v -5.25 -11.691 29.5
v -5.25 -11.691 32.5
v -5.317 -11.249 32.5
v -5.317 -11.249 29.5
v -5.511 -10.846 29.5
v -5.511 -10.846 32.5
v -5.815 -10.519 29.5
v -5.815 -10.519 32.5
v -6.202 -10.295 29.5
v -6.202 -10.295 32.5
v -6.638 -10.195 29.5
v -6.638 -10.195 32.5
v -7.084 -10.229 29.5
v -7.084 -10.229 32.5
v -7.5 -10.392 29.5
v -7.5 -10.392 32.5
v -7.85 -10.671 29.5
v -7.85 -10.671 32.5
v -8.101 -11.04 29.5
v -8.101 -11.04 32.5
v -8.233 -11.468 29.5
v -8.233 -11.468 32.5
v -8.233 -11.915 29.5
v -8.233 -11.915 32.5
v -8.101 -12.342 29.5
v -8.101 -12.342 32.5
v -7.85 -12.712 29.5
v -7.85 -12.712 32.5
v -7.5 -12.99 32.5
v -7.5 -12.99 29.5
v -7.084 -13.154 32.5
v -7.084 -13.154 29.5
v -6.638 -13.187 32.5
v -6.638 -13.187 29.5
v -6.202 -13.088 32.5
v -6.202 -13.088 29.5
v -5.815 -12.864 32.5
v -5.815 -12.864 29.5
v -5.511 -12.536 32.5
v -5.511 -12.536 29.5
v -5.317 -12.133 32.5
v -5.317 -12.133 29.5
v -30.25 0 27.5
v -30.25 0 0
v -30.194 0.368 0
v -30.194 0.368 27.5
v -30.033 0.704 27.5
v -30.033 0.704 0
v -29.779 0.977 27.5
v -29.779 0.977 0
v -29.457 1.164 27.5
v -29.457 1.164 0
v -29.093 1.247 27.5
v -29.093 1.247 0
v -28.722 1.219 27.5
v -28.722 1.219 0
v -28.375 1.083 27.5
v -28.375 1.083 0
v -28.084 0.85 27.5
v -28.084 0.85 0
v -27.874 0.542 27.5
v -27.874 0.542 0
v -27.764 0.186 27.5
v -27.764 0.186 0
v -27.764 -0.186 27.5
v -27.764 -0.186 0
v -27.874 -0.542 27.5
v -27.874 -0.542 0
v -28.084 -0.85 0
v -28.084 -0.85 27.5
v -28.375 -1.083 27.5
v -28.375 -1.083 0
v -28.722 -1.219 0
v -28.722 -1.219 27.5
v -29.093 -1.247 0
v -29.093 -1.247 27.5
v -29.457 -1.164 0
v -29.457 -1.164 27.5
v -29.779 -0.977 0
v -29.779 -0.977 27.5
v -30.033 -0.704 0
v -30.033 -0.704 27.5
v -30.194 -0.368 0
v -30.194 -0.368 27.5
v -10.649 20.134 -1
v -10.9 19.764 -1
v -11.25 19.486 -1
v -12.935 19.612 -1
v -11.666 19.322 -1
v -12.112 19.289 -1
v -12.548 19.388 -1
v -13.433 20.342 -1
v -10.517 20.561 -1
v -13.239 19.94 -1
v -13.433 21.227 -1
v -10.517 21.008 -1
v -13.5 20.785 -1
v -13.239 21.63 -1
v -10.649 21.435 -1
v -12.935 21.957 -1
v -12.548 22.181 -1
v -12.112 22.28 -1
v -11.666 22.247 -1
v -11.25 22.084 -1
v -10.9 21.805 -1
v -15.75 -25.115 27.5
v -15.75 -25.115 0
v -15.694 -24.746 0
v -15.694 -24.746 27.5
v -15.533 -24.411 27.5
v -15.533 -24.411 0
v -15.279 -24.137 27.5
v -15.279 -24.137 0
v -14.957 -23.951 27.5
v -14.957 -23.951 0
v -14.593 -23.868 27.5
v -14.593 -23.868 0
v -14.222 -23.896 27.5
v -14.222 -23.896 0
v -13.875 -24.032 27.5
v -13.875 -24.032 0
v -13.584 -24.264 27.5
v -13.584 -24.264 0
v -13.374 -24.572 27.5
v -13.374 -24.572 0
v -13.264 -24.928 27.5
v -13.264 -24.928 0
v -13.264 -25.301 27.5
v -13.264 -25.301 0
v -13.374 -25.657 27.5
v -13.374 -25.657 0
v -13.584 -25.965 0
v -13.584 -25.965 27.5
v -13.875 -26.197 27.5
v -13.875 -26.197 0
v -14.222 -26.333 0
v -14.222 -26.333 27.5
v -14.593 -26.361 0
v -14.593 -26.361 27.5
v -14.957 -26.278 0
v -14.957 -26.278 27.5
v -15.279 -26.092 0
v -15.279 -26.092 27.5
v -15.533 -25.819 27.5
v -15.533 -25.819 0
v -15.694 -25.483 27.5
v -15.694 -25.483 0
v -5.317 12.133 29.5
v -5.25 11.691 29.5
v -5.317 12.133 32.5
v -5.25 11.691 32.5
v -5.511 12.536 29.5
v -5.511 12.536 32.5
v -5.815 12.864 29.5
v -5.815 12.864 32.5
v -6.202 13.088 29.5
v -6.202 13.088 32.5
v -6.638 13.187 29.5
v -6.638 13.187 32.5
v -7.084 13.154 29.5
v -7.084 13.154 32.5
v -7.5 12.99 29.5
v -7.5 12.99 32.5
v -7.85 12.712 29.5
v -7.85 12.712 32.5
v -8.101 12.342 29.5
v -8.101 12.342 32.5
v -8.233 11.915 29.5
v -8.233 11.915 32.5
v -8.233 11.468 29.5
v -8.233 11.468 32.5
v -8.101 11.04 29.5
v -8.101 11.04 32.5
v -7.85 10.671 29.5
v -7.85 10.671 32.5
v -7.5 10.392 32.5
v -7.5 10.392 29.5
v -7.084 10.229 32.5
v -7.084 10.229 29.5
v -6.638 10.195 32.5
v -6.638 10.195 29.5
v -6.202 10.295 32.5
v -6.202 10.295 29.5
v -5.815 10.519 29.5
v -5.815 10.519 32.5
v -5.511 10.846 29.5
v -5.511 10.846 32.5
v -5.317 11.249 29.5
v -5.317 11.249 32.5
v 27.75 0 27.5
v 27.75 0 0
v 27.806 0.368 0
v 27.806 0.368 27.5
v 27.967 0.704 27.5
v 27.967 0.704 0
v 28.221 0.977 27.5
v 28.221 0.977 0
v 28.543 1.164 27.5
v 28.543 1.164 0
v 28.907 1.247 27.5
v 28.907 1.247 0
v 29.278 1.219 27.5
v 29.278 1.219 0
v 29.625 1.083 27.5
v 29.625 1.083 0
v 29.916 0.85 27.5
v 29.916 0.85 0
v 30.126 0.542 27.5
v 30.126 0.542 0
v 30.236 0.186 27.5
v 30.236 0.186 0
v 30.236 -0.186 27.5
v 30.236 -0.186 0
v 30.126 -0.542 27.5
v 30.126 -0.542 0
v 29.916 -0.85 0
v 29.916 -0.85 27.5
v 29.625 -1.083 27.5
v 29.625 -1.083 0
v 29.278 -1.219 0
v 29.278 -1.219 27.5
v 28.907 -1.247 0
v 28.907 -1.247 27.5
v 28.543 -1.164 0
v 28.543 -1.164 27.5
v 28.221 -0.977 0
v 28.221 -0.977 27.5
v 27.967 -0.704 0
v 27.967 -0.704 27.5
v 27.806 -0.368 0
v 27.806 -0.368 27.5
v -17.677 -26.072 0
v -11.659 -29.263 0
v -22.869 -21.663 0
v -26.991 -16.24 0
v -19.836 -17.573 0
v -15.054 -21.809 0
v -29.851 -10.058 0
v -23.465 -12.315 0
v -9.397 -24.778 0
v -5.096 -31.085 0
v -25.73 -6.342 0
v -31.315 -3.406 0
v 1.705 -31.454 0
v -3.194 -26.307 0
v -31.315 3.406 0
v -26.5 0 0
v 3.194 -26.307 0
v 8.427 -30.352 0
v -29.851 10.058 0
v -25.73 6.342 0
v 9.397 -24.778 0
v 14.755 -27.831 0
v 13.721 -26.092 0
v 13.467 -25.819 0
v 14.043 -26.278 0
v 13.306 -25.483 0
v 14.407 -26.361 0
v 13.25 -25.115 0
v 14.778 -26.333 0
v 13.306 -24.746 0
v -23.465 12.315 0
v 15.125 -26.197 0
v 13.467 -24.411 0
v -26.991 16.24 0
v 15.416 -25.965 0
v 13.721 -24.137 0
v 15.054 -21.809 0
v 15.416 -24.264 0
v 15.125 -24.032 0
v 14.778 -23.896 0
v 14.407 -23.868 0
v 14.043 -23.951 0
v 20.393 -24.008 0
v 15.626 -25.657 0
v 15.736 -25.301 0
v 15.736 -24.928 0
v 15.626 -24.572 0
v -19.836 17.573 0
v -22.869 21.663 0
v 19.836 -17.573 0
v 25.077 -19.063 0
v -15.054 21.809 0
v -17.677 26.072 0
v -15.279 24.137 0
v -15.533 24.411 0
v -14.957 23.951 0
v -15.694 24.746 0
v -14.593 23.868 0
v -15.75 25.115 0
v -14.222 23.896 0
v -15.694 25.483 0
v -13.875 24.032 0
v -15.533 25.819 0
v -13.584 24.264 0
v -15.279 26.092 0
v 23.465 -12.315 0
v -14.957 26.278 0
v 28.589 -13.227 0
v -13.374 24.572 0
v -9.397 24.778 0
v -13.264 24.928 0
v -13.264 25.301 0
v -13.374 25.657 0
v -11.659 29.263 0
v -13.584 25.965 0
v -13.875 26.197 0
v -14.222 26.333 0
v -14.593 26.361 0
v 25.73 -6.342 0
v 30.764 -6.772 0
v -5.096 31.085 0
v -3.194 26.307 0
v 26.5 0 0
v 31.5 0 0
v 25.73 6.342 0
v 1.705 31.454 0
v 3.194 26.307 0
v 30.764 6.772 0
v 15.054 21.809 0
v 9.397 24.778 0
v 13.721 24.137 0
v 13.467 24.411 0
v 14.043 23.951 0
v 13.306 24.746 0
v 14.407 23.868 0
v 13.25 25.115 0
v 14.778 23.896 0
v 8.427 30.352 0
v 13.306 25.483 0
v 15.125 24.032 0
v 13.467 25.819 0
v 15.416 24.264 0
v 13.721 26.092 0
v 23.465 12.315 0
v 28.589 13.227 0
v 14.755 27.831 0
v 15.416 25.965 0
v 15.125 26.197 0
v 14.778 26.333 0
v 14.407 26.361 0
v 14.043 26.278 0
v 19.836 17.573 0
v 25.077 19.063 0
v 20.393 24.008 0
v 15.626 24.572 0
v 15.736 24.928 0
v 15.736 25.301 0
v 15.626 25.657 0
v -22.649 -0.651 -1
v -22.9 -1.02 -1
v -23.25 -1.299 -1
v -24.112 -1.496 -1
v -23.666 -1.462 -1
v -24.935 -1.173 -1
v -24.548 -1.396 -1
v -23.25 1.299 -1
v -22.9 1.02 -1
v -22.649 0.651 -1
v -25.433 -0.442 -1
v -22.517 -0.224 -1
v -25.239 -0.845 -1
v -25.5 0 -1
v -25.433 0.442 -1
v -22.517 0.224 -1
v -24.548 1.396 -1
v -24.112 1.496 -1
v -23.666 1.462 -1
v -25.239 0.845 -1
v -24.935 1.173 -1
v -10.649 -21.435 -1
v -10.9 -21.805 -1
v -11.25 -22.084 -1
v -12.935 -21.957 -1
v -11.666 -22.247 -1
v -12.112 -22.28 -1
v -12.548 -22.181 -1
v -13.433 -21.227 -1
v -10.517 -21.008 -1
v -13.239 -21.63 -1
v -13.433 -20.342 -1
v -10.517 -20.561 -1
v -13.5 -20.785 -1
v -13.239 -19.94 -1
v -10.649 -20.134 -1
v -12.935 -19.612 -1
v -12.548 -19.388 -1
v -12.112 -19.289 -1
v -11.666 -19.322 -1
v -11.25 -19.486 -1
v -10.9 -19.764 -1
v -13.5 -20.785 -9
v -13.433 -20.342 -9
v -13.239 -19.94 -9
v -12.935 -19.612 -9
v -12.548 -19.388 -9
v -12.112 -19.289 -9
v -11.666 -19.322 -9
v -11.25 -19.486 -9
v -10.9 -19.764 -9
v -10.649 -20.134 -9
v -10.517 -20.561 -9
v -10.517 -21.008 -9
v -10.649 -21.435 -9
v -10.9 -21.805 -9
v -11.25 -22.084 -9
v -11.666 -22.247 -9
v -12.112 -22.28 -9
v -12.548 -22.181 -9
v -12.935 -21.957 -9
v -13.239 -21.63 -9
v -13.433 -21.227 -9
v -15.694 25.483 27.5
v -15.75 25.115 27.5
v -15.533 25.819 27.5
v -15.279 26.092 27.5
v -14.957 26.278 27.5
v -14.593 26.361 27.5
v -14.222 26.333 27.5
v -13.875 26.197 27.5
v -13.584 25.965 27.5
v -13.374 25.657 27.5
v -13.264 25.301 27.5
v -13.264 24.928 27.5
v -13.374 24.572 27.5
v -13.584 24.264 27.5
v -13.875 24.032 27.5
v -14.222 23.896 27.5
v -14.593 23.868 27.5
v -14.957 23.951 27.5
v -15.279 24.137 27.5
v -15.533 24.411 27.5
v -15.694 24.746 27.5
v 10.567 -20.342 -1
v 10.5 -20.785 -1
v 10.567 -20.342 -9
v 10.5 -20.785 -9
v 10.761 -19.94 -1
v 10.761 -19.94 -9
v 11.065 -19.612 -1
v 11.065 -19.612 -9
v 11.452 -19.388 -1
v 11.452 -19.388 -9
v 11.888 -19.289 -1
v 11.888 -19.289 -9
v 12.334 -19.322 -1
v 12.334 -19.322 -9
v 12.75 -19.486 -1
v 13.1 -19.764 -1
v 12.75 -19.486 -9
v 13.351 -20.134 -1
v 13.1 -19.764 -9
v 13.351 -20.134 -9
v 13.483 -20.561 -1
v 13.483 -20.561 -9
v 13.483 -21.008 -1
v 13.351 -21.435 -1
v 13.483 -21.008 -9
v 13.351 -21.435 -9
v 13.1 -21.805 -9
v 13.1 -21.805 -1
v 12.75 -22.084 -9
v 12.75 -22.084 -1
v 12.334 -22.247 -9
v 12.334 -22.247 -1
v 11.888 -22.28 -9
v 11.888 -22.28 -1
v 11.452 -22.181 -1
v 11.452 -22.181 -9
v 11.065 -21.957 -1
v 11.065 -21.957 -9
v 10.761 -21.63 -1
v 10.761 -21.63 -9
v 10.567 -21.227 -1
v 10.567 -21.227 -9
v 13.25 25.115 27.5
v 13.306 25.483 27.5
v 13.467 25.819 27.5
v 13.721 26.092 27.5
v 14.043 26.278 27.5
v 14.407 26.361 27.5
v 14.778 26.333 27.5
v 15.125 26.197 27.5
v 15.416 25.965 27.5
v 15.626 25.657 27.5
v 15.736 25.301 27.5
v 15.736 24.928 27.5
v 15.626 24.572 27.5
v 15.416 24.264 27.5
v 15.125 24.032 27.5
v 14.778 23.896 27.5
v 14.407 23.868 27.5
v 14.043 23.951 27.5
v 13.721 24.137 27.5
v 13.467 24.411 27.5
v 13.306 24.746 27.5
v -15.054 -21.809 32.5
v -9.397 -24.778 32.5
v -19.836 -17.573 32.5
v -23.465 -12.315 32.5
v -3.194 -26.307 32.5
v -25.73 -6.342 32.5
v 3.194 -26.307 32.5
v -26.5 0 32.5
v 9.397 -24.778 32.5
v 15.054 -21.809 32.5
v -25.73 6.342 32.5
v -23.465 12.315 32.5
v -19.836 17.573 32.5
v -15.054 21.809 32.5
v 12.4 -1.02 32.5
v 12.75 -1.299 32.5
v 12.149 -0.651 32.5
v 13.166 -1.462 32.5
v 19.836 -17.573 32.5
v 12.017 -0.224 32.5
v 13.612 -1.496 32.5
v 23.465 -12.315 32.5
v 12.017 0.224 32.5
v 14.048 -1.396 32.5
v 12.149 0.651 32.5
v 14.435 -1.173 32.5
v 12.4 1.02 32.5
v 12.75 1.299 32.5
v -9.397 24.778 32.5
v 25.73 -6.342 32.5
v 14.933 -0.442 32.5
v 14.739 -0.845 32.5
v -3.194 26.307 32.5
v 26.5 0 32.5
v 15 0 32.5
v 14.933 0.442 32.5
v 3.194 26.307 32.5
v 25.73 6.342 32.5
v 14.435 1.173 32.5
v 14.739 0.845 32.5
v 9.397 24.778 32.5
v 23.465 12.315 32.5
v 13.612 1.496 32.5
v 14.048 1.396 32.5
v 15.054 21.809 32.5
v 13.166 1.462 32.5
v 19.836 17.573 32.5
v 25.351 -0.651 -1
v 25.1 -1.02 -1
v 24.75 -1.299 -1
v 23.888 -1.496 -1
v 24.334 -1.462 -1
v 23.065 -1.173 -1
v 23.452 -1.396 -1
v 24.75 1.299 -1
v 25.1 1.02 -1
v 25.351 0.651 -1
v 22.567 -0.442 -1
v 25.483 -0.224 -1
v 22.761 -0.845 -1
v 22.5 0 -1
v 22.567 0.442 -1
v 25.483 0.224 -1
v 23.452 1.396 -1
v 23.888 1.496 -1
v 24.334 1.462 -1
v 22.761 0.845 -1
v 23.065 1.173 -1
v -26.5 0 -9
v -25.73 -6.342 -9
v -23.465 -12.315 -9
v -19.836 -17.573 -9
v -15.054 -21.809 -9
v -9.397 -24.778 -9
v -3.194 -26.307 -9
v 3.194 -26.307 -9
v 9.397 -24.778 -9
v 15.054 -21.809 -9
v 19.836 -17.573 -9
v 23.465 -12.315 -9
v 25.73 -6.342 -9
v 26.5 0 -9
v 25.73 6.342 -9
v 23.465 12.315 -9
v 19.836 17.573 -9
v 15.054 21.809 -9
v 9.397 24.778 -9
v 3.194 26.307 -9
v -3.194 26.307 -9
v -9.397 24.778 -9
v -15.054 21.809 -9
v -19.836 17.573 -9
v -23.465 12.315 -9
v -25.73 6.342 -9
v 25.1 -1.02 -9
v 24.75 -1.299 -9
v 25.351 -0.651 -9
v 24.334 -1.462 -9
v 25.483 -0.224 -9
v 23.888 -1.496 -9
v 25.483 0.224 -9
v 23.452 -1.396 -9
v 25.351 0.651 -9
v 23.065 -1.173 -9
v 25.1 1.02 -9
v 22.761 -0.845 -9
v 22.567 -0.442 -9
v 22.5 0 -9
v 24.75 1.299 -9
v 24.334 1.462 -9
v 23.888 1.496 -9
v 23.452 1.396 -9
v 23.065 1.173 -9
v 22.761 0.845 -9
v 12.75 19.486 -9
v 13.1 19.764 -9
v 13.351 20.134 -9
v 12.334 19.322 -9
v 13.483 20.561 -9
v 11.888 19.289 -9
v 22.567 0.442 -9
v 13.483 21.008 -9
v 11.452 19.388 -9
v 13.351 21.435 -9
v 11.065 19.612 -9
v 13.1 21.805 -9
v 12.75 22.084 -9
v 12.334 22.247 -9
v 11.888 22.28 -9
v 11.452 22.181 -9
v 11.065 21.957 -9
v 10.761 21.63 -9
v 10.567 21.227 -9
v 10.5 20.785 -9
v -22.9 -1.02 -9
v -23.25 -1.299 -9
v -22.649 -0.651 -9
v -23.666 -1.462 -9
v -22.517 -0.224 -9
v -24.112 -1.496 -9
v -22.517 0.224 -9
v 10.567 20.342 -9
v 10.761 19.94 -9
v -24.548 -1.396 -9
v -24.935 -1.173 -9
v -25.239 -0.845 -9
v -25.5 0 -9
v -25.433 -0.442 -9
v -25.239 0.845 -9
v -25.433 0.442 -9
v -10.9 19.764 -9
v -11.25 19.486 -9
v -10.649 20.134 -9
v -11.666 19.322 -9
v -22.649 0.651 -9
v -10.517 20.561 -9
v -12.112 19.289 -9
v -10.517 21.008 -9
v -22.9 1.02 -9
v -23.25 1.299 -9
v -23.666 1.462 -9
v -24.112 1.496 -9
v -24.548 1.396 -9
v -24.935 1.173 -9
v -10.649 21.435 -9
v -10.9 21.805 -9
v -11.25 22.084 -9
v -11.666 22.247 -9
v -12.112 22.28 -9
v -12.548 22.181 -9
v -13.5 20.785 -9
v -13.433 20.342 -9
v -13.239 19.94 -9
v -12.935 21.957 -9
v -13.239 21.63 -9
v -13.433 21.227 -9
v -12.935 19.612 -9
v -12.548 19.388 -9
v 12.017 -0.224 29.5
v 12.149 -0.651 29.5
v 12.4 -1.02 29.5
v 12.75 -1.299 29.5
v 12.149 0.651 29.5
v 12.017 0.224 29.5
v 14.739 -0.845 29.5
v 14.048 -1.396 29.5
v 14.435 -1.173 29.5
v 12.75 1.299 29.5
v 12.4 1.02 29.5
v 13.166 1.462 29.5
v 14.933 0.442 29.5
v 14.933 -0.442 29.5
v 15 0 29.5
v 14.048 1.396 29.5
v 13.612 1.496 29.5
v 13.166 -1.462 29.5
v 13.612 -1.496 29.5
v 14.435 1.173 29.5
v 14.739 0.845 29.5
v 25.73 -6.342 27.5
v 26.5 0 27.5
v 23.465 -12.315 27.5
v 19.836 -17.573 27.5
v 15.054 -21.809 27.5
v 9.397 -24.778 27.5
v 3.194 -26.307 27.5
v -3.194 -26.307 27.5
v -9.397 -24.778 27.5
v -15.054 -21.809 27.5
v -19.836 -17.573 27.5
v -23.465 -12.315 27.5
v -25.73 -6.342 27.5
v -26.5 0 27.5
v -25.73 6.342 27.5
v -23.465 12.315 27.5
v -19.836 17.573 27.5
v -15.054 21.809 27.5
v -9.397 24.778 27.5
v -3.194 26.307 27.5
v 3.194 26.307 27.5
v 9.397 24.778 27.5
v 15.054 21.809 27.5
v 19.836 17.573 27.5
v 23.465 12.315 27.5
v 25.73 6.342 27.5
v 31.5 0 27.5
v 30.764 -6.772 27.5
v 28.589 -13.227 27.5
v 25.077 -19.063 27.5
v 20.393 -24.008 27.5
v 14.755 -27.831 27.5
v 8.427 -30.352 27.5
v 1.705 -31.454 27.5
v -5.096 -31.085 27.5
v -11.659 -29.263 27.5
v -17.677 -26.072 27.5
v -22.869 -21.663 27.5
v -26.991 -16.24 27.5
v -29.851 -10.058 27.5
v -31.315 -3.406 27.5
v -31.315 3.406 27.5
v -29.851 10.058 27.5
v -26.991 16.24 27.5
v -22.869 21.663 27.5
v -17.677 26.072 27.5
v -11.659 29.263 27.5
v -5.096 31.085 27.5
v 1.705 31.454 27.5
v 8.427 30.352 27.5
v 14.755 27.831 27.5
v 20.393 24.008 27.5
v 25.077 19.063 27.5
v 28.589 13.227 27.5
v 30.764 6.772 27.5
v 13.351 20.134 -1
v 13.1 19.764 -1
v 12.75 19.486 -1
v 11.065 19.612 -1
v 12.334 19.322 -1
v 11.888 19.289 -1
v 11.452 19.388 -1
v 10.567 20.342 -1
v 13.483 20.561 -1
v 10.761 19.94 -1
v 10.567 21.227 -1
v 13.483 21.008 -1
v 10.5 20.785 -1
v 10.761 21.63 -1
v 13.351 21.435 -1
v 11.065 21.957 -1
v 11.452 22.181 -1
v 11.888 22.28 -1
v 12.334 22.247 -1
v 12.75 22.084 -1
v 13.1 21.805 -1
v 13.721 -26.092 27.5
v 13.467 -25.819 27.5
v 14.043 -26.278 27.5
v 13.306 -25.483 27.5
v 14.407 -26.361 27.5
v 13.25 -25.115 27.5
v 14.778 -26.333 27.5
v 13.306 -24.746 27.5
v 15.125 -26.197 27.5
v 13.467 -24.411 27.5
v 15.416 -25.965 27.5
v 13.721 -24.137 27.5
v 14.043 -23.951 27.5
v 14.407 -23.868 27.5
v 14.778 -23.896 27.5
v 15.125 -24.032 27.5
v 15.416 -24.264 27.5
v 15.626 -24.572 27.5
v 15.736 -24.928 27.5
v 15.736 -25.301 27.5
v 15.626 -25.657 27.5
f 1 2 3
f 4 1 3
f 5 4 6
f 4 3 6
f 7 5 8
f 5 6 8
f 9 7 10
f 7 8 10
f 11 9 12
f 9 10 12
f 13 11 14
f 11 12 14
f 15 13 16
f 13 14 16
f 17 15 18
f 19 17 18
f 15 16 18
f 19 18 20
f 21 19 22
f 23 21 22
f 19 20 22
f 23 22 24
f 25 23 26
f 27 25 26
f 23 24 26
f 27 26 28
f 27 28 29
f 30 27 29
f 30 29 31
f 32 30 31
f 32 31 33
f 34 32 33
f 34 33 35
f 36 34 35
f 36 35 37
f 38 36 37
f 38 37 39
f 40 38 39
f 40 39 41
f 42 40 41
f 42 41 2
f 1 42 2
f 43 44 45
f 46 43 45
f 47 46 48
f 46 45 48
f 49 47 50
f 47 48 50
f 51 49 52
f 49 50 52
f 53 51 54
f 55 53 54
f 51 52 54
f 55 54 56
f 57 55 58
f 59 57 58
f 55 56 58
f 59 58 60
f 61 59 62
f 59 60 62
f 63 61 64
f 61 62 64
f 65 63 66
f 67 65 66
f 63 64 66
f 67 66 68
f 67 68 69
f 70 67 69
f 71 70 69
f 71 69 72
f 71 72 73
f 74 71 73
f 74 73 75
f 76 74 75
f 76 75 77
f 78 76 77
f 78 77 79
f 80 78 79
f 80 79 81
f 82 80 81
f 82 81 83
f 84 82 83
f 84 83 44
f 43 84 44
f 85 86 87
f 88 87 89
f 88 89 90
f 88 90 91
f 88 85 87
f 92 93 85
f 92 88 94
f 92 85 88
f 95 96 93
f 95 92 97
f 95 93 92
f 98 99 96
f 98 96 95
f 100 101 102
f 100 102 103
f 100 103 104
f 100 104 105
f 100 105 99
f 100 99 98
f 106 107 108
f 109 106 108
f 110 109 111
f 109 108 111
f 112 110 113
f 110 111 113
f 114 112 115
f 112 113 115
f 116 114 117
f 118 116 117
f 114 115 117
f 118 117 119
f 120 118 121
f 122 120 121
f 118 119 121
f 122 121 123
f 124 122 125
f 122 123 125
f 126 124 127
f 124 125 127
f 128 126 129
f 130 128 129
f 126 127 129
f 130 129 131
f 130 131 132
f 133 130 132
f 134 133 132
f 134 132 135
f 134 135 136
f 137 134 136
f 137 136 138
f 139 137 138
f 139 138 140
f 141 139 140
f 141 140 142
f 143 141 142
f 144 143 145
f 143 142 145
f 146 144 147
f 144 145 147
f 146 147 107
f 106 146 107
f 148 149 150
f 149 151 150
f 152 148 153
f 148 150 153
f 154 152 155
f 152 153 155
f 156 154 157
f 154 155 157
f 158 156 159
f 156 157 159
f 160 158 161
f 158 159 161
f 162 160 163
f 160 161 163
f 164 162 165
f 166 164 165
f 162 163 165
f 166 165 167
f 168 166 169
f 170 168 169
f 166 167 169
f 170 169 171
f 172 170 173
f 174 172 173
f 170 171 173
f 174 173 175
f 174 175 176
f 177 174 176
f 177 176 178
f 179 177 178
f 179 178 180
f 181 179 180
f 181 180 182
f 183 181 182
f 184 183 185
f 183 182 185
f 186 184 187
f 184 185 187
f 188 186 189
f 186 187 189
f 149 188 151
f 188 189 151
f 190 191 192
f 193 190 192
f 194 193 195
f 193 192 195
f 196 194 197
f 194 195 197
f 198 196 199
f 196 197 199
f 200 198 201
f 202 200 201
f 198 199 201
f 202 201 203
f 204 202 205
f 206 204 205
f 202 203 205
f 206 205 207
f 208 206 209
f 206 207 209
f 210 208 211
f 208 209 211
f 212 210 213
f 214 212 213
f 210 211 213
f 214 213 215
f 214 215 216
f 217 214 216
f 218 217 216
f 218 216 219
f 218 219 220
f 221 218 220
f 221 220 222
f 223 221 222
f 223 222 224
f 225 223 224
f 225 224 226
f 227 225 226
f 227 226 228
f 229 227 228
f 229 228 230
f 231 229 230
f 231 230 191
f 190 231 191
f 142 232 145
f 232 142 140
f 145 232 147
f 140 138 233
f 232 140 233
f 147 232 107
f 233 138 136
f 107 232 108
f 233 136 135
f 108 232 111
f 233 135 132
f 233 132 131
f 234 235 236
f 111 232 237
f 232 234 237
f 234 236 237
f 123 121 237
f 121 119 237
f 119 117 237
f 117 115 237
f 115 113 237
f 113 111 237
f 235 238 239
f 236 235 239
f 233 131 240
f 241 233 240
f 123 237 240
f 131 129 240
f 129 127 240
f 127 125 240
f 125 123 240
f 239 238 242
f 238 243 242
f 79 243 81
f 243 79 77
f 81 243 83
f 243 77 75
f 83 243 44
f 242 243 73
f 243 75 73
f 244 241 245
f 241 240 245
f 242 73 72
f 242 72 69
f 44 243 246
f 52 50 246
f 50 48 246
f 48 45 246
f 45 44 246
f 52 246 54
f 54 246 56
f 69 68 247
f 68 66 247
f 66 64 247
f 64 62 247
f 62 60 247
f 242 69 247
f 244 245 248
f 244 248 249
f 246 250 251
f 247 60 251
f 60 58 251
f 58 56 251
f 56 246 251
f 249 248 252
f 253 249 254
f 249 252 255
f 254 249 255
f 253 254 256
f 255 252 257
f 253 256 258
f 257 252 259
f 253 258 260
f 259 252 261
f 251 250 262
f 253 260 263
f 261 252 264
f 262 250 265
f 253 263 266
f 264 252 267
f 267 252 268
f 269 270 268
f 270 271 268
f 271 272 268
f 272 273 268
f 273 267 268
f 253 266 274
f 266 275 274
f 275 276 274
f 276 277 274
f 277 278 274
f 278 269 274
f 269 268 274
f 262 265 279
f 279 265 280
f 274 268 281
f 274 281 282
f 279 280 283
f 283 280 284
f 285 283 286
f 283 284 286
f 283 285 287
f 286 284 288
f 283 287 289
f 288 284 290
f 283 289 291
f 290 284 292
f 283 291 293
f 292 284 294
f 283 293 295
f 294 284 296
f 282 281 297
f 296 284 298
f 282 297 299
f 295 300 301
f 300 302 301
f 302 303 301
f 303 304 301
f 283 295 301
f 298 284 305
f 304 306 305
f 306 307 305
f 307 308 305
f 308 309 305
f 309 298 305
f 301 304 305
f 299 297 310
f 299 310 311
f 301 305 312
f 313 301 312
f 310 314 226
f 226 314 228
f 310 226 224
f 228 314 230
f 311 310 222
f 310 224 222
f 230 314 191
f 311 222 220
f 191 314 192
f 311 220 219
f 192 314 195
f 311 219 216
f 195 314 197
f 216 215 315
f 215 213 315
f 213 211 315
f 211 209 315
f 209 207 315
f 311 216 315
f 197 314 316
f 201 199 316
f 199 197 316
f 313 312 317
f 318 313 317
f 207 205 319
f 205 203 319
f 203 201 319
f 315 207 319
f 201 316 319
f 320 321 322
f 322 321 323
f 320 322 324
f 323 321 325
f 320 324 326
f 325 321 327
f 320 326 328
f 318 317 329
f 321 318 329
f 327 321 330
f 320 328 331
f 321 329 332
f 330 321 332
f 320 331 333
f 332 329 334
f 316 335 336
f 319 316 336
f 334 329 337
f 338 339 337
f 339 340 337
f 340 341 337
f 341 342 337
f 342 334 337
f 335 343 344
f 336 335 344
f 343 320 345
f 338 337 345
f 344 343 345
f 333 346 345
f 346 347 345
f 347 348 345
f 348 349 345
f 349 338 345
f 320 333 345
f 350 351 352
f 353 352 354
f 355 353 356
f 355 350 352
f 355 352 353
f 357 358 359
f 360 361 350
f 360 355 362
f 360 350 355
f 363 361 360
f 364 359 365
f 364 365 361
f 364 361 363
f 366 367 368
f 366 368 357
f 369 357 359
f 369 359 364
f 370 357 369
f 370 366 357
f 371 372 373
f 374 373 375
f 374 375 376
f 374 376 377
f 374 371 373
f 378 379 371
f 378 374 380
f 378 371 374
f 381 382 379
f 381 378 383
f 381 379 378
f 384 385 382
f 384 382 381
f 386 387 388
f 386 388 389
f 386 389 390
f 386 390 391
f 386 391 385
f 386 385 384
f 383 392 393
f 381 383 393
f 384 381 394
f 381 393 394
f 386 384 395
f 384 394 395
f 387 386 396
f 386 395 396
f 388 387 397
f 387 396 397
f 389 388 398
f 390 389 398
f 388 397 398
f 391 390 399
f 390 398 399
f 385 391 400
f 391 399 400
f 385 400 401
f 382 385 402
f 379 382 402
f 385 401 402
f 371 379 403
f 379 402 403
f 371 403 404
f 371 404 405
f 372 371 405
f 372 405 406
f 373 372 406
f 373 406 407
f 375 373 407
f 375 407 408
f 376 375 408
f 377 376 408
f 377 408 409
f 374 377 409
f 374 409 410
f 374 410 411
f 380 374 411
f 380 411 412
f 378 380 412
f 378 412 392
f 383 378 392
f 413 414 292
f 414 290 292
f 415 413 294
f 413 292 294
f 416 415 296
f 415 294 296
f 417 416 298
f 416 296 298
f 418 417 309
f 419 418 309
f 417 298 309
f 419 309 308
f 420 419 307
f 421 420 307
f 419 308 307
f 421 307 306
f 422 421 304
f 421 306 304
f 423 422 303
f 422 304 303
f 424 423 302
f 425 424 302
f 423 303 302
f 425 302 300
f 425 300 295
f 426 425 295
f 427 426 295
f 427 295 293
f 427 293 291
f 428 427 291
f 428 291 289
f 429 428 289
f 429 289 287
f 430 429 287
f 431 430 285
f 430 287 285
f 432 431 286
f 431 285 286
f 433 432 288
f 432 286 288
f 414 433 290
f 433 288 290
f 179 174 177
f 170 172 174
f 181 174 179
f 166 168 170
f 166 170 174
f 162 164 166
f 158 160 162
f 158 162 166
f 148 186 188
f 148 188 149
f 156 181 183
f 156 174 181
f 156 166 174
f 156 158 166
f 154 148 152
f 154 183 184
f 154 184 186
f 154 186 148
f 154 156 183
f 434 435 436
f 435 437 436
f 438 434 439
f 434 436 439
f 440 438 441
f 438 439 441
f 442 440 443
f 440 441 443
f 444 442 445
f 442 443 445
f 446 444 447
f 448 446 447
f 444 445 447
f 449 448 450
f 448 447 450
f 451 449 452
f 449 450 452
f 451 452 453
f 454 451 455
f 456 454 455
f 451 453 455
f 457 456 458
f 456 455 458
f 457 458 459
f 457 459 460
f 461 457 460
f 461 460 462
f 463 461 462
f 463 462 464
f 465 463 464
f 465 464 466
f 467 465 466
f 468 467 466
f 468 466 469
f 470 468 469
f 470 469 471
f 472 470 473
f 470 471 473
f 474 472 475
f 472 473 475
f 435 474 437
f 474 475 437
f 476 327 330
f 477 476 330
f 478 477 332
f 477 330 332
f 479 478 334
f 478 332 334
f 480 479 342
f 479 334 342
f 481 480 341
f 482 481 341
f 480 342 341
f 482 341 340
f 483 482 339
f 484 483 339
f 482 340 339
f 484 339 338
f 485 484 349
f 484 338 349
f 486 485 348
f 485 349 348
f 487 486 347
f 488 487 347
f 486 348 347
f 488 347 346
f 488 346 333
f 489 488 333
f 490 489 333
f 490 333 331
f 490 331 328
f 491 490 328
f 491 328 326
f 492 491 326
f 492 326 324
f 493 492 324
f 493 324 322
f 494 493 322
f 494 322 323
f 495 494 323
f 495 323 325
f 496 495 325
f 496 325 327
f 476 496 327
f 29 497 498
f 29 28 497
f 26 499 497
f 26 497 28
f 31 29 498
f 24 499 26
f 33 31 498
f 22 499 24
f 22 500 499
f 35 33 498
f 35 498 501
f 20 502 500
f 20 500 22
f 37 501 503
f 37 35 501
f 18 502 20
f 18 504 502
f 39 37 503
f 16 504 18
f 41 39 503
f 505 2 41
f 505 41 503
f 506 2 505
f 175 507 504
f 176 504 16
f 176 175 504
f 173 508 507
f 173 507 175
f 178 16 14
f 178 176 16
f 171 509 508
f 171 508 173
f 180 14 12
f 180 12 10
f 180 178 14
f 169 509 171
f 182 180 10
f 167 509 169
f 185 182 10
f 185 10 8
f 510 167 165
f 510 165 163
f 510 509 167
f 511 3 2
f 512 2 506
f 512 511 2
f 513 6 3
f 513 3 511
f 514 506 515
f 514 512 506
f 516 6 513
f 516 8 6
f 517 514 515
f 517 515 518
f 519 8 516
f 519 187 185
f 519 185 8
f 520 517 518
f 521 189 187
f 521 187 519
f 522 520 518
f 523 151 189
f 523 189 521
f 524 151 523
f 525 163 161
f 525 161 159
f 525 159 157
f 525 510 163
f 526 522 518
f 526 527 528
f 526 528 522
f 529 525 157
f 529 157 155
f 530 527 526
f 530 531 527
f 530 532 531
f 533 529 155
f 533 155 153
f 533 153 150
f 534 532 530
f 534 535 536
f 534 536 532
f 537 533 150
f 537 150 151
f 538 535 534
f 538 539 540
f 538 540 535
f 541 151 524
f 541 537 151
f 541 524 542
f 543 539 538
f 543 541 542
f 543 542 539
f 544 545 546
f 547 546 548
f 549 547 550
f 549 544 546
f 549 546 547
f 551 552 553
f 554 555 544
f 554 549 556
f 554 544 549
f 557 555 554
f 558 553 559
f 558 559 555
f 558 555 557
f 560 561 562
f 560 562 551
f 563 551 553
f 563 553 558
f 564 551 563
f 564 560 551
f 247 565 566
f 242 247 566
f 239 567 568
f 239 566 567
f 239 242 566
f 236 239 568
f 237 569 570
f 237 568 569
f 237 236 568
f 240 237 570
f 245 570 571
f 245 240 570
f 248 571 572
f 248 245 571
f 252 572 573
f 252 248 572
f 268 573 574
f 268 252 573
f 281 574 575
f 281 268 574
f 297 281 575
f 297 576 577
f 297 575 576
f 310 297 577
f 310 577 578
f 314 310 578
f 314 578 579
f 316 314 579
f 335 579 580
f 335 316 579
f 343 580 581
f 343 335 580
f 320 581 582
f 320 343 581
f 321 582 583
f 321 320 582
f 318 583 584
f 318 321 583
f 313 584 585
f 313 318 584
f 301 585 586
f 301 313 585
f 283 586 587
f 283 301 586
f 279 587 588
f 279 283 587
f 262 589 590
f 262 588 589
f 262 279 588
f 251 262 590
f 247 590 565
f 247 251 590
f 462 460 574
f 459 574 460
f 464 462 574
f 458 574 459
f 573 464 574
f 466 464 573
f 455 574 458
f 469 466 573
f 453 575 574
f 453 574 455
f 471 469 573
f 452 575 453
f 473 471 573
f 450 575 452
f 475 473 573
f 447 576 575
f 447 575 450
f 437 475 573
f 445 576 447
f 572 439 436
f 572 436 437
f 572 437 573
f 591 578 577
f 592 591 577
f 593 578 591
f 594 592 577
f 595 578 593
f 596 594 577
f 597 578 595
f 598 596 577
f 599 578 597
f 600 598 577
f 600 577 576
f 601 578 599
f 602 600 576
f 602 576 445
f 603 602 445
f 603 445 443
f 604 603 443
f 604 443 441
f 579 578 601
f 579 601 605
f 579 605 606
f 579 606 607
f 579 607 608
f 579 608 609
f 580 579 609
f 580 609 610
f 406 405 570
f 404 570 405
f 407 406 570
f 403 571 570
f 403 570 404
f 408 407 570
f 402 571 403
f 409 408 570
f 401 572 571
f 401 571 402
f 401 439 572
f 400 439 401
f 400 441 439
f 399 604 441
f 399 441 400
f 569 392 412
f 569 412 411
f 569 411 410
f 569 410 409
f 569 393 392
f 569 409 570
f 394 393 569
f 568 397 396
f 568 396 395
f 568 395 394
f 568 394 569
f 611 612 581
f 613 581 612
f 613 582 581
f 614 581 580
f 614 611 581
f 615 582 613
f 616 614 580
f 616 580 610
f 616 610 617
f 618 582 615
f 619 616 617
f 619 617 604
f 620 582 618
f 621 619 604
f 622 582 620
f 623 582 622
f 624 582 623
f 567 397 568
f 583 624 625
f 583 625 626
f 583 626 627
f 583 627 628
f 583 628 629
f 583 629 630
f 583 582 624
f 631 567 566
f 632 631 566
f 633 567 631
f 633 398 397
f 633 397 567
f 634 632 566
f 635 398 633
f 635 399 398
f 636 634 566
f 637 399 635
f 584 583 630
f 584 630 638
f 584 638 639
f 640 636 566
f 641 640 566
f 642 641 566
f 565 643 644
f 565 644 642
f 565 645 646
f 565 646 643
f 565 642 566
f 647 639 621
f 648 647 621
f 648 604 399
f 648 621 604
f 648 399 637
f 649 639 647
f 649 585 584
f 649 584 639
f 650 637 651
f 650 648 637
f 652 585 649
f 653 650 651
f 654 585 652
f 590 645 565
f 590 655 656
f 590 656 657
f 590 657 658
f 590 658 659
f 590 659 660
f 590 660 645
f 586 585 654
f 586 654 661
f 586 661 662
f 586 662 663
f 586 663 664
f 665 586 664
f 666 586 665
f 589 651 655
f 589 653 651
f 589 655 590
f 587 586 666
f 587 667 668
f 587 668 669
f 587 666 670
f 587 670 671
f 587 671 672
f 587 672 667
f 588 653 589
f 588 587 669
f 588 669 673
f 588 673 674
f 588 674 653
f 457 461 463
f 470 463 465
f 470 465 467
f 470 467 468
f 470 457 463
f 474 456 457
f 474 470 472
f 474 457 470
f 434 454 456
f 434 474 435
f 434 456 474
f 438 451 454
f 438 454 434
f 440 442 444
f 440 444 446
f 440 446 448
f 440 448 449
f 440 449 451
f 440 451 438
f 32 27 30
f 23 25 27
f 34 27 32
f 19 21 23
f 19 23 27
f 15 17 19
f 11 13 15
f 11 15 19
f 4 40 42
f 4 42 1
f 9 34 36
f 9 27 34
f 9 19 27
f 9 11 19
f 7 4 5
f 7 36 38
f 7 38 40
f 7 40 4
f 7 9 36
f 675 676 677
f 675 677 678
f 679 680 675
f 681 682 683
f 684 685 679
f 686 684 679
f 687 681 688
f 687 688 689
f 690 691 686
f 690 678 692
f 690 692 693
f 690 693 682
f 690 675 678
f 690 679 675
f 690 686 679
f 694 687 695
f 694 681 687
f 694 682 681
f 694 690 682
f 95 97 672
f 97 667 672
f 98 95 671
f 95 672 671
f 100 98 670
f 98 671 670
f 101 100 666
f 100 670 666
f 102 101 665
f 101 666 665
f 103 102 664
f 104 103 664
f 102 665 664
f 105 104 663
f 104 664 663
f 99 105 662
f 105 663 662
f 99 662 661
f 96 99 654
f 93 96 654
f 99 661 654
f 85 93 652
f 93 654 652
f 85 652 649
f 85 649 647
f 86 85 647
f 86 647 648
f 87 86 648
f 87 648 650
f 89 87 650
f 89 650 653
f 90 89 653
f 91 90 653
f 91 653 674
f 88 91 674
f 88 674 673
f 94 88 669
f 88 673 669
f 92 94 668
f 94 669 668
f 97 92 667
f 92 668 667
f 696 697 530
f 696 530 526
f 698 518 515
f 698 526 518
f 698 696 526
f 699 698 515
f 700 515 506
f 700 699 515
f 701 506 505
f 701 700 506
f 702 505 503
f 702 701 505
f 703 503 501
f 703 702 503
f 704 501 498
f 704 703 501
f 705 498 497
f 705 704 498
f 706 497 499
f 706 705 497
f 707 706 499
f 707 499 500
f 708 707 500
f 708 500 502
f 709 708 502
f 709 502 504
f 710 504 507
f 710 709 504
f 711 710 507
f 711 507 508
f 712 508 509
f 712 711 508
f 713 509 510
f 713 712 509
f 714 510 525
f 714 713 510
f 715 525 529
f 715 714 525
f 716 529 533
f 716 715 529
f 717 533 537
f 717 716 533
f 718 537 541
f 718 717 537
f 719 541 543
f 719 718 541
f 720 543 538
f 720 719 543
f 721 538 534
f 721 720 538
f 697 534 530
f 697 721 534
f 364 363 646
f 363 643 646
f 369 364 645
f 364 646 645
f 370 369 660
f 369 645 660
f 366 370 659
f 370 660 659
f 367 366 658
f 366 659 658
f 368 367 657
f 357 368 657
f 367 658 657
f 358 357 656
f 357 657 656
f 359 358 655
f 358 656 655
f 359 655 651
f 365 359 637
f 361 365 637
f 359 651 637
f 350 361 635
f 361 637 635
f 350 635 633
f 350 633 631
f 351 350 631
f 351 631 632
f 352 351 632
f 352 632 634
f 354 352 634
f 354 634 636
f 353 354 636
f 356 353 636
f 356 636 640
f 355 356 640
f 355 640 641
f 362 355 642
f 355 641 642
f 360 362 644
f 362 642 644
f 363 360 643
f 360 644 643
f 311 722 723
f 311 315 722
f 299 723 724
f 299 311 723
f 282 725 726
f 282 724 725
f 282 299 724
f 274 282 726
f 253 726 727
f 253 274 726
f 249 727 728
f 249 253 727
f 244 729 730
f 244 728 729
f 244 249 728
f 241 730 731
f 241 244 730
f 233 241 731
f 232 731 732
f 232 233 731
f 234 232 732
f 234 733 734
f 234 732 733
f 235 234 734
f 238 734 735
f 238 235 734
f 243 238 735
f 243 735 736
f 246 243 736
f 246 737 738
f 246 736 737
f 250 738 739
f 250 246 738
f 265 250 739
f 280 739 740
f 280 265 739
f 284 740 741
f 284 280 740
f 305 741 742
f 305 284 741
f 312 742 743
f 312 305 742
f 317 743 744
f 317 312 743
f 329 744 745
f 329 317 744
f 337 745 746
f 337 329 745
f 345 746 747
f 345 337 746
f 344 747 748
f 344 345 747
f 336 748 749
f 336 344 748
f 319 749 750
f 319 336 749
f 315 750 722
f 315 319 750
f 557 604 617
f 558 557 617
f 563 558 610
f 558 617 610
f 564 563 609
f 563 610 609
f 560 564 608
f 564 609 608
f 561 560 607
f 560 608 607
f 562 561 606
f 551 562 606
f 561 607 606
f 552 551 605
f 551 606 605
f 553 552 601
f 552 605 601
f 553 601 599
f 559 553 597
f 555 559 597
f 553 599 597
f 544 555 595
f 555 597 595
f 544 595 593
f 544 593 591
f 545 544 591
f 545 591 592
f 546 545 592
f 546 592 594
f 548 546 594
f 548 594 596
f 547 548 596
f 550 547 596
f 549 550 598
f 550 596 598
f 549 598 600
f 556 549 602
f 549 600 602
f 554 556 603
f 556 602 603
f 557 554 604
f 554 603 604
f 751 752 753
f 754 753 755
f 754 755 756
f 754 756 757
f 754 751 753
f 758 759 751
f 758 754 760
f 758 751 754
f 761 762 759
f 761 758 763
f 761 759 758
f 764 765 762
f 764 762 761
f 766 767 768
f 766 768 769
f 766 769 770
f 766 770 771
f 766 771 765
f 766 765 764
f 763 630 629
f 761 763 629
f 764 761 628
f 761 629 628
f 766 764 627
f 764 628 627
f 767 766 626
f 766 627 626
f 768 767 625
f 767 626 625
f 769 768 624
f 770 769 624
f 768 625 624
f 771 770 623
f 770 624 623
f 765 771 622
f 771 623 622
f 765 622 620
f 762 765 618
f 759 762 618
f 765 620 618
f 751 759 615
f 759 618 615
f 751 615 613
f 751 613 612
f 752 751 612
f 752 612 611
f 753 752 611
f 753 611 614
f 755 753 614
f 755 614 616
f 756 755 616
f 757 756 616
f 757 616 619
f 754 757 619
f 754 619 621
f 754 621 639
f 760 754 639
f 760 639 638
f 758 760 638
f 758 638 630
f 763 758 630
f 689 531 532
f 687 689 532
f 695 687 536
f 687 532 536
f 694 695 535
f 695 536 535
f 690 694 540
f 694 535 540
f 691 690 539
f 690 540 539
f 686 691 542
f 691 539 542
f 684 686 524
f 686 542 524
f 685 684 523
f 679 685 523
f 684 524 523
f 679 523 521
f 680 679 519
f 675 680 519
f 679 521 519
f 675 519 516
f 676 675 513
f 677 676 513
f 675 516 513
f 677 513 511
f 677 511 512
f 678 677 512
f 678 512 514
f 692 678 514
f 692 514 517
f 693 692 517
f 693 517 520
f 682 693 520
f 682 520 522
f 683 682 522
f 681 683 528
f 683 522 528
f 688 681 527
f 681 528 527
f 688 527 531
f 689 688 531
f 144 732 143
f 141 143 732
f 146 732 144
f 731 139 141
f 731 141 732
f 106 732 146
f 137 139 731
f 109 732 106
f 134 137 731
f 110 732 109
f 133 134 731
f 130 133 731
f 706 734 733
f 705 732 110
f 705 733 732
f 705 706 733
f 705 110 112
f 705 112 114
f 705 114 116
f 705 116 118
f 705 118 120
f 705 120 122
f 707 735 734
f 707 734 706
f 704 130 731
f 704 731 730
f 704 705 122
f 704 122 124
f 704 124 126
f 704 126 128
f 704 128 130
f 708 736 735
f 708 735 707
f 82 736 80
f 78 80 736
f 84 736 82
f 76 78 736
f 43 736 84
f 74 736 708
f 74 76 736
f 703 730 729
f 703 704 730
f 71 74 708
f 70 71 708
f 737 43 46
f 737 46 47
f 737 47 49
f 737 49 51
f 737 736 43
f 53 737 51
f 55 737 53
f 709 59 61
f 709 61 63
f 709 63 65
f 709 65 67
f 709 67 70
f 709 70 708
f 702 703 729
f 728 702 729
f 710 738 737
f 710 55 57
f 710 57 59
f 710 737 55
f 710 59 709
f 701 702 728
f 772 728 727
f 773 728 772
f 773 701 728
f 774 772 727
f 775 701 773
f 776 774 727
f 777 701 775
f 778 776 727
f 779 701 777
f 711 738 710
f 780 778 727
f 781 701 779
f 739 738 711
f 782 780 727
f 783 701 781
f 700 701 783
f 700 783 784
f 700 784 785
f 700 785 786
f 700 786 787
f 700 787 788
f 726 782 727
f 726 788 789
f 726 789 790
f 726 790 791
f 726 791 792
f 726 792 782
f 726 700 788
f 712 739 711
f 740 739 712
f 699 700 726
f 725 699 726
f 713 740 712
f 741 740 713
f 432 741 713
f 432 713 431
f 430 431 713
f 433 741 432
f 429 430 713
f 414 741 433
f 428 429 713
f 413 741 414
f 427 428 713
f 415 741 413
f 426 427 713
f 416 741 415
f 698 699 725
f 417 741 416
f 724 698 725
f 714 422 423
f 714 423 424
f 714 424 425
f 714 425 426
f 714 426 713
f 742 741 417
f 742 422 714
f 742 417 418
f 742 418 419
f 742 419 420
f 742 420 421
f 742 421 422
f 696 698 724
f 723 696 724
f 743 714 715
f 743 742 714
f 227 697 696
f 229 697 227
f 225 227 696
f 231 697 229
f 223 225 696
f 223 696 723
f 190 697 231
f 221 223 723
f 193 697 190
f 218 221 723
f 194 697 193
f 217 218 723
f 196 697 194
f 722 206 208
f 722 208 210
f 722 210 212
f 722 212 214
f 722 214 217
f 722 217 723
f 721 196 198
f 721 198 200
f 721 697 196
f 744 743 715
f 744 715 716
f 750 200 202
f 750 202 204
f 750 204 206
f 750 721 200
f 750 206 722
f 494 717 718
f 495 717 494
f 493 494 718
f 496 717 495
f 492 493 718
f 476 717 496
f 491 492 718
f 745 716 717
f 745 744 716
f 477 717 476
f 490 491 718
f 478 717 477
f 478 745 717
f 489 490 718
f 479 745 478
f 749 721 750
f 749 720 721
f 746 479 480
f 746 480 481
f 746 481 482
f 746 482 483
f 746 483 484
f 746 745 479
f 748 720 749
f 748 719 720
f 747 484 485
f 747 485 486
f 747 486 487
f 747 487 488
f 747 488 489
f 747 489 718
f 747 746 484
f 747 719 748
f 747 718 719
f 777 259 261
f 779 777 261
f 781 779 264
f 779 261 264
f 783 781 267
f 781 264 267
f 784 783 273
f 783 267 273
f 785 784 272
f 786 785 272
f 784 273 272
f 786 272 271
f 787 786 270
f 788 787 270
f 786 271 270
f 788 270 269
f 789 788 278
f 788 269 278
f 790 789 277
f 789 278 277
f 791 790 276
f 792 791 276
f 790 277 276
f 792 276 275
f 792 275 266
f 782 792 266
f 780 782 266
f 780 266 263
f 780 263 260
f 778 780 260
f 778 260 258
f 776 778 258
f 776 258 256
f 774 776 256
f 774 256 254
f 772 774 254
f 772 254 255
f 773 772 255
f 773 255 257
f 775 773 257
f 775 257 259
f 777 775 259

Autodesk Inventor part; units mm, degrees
ref_plane "YZ Plane" through (0, 0, 0) normal (1, 0, 0) x (0, 1, 0)
ref_plane "XZ Plane" through (0, 0, 0) normal (0, 1, 0) x (-1, 0, 0)
ref_plane "XY Plane" through (0, 0, 0) normal (0, 0, 1) x (1, 0, 0)
sketch "스케치1" plane through (0, 0, 0) normal (0, 0, 1) x (1, 0, 0)
  circle A0 centre (0, 0) radius 31.5
  dimension "d0" = 63
extrude "돌출1" add sketch "스케치1" along normal blind 27.5
sketch "스케치2" plane through (0, 0, 27.5) normal (0, 0, 1) x (1, 0, 0)
  circle A0 centre (0, 0) radius 26.5
  dimension "d3" = 53
extrude "돌출2" add sketch "스케치2" along normal blind 5
sketch "스케치3" plane through (0, 0, 0) normal (0, 0, -1) x (-1, 0, 0)
  circle A0 centre (0, 0) radius 26.5 projected
  circle A1 centre (0, 0) radius 26.5
  dimension "d6" = 53
extrude "돌출3" add sketch "스케치3" along normal blind 9
sketch "스케치5" plane through (0, 0, 32.5) normal (0, 0, 1) x (1, 0, 0)
  circle A0 centre (0, 0) radius 13.5
  circle A1 centre (-6.75, 11.6913) radius 1.5
  circle A2 centre (-6.75, -11.6913) radius 1.5
  circle A3 centre (13.5, 0) radius 1.5
  dimension "d19" = 360
  dimension "d39" = 360
  dimension "d13" = 27
  dimension "d43" = 360
extrude "돌출5" cut sketch "스케치5" against normal blind 3 contours A0 A3 | A0 A3 | A1 A0 | A0 A1 | A2 A0 | A0 A2
sketch "스케치6" plane through (0, 0, -9) normal (0, 0, -1) x (-1, 0, 0)
  circle A0 centre (0, 0) radius 24
  circle A1 centre (24, 0) radius 1.5
  circle A2 centre (12, 20.7846) radius 1.5
  circle A3 centre (-12, 20.7846) radius 1.5
  circle A4 centre (-24, 0) radius 1.5
  circle A5 centre (-12, -20.7846) radius 1.5
  circle A6 centre (12, -20.7846) radius 1.5
  dimension "d21" = 48
  dimension "d22" = 3
  dimension "d25" = 360
extrude "돌출6" cut sketch "스케치6" against normal blind 8 contours A0 A1 | A0 A1 | A2 A0 | A0 A2 | A6 A0 | A0 A6 | A3 A0 | A0 A3 | A5 A0 | A0 A5 | A4 A0 | A0 A4
sketch "스케치7" plane through (0, 0, 0) normal (0, 0, -1) x (-1, 0, 0)
  circle A0 centre (0, 0) radius 29
  circle A1 centre (-29, 0) radius 1.25
  circle A2 centre (-14.5, -25.1147) radius 1.25
  circle A3 centre (14.5, -25.1147) radius 1.25
  circle A4 centre (29, 0) radius 1.25
  circle A5 centre (14.5, 25.1147) radius 1.25
  circle A6 centre (-14.5, 25.1147) radius 1.25
  dimension "d29" = 58
  dimension "d30" = 2.5
  dimension "d33" = 360
extrude "돌출7" cut sketch "스케치7" against normal blind 53.25 contours A0 A4 | A0 A4 | A5 A0 | A0 A5 | A3 A0 | A0 A3 | A6 A0 | A0 A6 | A2 A0 | A0 A2 | A1 A0 | A0 A1
properties part number "부품1"
